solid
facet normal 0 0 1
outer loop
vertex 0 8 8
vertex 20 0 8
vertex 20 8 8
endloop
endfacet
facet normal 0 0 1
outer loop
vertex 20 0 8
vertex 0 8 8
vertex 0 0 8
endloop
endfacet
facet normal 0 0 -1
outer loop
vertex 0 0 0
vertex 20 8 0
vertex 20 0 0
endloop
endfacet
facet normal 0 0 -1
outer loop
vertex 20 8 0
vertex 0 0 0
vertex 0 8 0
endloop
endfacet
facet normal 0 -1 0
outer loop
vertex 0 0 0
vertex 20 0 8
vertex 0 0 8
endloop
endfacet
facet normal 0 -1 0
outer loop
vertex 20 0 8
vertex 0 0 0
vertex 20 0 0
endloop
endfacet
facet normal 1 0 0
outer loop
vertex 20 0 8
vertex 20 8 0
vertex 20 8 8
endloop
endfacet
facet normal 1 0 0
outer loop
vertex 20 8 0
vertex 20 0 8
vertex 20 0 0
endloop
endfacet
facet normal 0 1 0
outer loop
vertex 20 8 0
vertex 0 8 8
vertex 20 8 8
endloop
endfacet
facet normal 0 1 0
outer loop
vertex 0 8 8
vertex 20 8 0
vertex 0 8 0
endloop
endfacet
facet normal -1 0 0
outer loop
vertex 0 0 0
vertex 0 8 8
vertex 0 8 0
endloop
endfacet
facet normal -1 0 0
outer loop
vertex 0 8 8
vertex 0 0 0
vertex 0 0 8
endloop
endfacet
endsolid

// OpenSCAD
// DIP はんだ付け治具
// DIP16 部品のはんだ付け時に支えるブロック
//
// 外形: 20mm x 8mm x 8mm

cube([20, 8, 8]);
